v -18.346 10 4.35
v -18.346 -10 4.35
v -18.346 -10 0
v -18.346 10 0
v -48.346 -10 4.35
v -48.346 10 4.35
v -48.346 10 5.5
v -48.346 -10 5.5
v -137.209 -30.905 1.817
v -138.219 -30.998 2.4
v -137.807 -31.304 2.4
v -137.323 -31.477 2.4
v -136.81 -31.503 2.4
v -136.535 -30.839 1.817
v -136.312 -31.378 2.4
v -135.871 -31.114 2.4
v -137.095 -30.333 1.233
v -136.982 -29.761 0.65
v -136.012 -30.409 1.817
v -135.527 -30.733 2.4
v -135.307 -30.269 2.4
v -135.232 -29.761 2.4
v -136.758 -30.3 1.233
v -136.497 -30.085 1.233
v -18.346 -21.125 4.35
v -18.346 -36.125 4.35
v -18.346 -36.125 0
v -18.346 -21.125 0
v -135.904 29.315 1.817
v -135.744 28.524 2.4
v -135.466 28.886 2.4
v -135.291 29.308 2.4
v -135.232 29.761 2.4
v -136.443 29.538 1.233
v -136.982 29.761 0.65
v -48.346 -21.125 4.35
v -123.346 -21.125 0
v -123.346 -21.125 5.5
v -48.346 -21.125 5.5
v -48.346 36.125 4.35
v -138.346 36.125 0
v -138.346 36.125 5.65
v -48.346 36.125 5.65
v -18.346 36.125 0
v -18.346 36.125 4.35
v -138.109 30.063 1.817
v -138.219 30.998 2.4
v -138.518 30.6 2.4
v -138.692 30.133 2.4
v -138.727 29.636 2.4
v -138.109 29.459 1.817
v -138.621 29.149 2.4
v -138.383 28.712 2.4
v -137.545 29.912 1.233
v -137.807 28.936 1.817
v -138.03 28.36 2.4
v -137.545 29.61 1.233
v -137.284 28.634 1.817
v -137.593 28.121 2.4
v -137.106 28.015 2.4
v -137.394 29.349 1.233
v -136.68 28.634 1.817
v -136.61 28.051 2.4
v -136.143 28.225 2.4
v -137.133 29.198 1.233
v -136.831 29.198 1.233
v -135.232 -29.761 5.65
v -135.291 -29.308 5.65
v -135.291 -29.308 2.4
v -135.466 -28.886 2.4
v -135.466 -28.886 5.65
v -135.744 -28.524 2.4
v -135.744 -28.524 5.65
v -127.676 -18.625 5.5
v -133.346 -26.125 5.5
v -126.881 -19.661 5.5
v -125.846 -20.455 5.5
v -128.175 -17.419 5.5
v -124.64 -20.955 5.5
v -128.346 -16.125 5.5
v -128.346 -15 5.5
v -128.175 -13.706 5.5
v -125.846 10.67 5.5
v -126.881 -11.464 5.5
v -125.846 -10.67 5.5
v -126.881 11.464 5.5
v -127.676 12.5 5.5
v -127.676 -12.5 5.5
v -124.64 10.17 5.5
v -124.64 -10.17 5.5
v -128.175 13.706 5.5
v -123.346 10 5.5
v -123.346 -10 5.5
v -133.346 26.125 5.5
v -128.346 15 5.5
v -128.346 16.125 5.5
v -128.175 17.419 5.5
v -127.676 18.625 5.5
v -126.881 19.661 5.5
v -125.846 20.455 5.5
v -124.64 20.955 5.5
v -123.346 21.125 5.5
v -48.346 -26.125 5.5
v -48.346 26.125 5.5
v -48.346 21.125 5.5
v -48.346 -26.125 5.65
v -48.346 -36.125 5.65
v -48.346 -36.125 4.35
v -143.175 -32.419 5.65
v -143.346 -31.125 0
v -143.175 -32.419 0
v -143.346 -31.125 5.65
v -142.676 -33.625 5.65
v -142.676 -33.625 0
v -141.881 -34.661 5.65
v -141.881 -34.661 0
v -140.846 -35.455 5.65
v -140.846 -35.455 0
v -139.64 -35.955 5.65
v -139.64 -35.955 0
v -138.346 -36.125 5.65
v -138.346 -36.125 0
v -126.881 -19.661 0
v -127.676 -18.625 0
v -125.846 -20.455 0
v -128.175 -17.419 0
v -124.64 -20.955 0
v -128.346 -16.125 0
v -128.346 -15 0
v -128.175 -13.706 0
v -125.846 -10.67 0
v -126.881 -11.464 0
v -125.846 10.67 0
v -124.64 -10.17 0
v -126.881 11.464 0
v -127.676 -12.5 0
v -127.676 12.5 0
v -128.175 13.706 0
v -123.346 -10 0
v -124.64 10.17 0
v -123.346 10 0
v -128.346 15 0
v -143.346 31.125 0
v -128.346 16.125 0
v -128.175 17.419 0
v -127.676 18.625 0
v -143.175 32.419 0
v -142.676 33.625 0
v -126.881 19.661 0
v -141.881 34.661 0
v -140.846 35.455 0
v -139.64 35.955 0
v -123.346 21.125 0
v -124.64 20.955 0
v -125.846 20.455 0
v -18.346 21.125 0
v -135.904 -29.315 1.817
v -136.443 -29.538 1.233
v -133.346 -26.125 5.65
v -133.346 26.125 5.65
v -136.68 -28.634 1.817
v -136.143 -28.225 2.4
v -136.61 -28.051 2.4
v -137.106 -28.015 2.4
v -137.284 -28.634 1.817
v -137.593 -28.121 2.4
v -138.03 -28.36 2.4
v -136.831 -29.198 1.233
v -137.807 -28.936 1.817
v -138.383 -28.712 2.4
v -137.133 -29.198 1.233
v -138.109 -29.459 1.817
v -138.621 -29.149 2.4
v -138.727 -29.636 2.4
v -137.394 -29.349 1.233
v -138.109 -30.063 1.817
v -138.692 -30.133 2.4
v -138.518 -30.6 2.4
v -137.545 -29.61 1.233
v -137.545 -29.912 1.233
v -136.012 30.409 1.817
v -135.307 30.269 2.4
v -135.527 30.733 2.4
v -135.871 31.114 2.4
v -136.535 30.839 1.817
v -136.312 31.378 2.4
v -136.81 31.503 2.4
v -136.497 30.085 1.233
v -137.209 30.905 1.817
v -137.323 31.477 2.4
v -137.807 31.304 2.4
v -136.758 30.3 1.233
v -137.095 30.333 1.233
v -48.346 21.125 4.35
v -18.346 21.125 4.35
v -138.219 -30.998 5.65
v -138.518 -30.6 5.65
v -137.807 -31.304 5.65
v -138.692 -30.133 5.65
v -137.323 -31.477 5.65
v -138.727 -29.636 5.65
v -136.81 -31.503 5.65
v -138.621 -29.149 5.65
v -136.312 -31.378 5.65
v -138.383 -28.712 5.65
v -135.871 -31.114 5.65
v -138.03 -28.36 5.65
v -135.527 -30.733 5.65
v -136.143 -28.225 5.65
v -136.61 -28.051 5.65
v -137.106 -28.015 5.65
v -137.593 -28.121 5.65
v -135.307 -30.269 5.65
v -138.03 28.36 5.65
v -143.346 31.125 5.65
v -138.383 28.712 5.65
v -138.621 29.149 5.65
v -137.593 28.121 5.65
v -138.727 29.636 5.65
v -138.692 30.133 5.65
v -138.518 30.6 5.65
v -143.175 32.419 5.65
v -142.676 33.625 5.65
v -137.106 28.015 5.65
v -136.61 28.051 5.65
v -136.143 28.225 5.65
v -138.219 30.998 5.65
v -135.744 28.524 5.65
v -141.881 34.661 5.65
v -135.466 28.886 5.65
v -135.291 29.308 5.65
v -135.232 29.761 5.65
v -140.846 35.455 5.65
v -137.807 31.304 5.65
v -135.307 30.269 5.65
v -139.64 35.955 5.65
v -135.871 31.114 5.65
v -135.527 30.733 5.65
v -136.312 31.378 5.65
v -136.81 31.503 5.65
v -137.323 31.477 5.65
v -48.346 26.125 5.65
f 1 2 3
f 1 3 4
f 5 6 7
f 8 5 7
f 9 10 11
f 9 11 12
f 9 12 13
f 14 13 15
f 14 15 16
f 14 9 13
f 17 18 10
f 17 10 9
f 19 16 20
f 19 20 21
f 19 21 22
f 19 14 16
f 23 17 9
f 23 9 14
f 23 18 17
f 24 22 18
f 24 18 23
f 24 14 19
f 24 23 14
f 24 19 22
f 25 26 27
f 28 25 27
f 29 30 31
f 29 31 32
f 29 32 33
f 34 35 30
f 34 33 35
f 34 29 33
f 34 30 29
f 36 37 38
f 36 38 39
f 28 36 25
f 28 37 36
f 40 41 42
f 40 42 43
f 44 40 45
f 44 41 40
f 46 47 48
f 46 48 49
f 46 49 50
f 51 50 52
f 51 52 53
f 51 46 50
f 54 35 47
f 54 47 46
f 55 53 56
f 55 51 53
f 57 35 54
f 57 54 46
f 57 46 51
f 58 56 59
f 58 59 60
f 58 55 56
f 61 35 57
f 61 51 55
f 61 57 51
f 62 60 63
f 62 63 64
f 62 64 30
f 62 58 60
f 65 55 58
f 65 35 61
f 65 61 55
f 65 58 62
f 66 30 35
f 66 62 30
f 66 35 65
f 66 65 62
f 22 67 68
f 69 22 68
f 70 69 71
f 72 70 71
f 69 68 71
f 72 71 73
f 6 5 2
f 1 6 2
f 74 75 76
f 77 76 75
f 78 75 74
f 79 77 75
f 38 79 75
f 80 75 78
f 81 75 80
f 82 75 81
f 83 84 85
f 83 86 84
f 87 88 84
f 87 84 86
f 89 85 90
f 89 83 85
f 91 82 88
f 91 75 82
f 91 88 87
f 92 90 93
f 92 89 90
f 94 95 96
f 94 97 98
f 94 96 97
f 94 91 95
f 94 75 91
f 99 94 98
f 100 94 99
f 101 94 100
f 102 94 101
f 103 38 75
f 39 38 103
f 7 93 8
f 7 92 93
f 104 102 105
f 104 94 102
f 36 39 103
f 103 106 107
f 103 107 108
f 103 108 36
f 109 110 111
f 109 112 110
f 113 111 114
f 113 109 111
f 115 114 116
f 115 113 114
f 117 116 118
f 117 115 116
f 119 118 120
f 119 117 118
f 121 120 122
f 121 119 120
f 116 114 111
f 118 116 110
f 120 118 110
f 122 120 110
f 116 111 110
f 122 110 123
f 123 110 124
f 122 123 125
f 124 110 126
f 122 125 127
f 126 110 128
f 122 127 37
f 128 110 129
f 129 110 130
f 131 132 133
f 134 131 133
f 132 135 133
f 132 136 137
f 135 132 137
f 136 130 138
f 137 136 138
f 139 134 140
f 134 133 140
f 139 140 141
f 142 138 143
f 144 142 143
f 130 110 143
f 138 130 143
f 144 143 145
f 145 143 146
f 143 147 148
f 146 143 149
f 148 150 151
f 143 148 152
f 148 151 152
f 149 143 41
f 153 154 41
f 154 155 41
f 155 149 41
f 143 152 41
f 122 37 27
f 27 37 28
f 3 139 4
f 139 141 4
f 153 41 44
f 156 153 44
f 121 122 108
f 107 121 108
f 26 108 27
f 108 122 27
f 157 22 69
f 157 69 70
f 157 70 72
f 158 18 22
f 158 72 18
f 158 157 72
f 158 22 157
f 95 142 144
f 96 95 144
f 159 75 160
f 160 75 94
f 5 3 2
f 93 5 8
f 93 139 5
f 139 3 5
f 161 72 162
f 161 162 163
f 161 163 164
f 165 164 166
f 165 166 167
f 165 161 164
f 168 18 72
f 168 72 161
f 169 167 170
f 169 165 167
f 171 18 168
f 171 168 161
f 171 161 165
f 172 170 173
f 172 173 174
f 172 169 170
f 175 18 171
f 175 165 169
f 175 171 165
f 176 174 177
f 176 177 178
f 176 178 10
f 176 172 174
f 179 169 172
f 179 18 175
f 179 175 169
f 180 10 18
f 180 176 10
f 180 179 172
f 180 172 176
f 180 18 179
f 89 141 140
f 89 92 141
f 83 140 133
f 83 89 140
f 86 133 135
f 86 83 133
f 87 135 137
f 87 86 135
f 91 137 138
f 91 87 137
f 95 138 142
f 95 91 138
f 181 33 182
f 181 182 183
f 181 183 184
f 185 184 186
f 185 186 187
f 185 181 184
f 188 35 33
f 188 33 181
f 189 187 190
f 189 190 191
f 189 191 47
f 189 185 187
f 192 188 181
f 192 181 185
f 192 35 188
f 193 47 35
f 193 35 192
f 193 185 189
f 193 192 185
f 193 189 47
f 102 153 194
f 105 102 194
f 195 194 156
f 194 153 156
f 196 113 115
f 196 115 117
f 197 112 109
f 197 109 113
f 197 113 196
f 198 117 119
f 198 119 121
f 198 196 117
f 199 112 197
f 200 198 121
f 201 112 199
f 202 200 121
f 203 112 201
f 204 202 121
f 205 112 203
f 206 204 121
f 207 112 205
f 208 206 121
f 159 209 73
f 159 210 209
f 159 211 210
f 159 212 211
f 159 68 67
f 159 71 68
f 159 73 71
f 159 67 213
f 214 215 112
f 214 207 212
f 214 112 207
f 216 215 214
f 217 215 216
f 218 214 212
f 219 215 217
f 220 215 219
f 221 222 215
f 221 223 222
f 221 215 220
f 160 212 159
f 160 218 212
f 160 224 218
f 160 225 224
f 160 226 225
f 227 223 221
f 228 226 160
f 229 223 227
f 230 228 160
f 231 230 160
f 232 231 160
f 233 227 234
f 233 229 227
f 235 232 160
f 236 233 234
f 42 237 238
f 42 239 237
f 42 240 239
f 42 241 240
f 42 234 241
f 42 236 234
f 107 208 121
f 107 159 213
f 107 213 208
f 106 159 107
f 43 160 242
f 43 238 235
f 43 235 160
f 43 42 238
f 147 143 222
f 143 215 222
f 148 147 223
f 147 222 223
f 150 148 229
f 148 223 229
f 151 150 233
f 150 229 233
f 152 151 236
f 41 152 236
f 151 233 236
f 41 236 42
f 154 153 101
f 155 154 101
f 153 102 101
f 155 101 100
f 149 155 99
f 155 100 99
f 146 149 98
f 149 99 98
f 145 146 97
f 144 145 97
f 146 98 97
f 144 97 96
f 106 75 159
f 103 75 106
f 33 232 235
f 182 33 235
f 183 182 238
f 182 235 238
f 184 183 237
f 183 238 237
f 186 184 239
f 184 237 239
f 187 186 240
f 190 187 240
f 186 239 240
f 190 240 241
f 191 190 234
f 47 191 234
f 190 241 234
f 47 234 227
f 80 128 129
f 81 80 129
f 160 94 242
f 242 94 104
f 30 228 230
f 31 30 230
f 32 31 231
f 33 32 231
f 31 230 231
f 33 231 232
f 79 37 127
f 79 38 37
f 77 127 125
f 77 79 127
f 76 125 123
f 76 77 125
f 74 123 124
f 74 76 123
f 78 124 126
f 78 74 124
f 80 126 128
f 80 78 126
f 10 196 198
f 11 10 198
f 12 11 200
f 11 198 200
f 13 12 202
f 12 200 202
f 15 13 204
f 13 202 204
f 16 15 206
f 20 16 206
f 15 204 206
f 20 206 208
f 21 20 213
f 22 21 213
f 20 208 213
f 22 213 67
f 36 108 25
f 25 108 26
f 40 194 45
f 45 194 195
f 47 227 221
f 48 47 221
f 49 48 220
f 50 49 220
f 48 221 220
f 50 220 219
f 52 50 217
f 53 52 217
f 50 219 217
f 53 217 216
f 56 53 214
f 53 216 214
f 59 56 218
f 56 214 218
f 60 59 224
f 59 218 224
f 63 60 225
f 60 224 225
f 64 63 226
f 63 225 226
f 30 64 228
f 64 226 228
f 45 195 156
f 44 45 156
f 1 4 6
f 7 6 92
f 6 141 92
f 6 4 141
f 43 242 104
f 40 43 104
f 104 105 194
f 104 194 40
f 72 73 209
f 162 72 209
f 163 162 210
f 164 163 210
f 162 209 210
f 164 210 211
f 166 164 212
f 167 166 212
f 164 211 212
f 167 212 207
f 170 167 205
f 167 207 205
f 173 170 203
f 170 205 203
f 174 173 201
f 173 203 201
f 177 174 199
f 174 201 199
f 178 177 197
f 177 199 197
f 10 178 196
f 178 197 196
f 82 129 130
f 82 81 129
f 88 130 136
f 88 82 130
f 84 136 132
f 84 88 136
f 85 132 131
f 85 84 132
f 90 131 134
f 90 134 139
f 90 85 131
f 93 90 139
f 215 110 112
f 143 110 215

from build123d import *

# Parameters (mm, degrees)
F0_W      = 210
F0_H      = 52.25
F0_W_2    = 200
F0_H_2    = 42.25
F1_DEPTH  = 5.5
F0_W_3    = 230
F0_H_3    = 72.25
F2_DEPTH  = 5.65
F4_DEPTH  = 100
F6_DEPTH  = 5
F7_SIZE   = 1.75
F8_R      = 5
F9_R      = 5
F10_W     = 20
F10_H     = 5.5
F11_DEPTH = 110
F12_W     = 30
F12_H     = 1.15
F13_DEPTH = 25
F14_R     = 5


with BuildPart() as f1:
    # F0 (on Top) → F1 (new body)
    with BuildSketch(Plane.XY):
        with Locations((-28.3456140757, 0)):
            Rectangle(F0_W, F0_H)
        with Locations((-28.3456140757, 0)):
            Rectangle(F0_W_2, F0_H_2, mode=Mode.SUBTRACT)
    extrude(amount=F1_DEPTH)

    # F0 (on Top) → F2 (join)
    with BuildSketch(Plane.XY):
        with Locations((-28.3456140757, 0)):
            Rectangle(F0_W_3, F0_H_3)
        with Locations((-28.3456140757, 0)):
            Rectangle(F0_W, F0_H, mode=Mode.SUBTRACT)
    extrude(amount=F2_DEPTH)

    # F3 (on face) → F4 (cut)
    with BuildSketch(Plane.XZ.offset(36.125)):
        Polygon((-48.3456140757, 5.65), (-48.3456140757, 4.35), (-18.3456140757, 4.35), (-18.3456140757, 0), (86.6543859243, 0), (86.6543859243, 5.65), align=None)
    extrude(amount=-F4_DEPTH, mode=Mode.SUBTRACT)

    # F5 (on face) → F6 (cut)
    with BuildSketch(Plane.XY.offset(5.65)):
        with BuildLine():
            ThreePointArc((-135.231653045, 29.7610389693), (-136.3119570383, 31.3778281512), (-138.2190899121, 30.9984758364))
            Line((-138.2190899121, 30.9984758364), (-135.7442161779, 28.5236021022))
            ThreePointArc((-135.7442161779, 28.5236021022), (-135.3648638631, 29.0913429627), (-135.231653045, 29.7610389693))
        make_face()
        with BuildLine():
            Line((-135.7442161779, 28.5236021022), (-138.2190899121, 30.9984758364))
            ThreePointArc((-138.2190899121, 30.9984758364), (-138.2190899121, 28.5236021022), (-135.7442161779, 28.5236021022))
        make_face()
        with BuildLine():
            ThreePointArc((-135.7442161779, -28.5236021022), (-138.2190899121, -28.5236021022), (-138.2190899121, -30.9984758364))
            Line((-138.2190899121, -30.9984758364), (-135.7442161779, -28.5236021022))
        make_face()
        with BuildLine():
            Line((-135.7442161779, -28.5236021022), (-138.2190899121, -30.9984758364))
            ThreePointArc((-138.2190899121, -30.9984758364), (-136.3119570383, -31.3778281512), (-135.231653045, -29.7610389693))
            ThreePointArc((-135.231653045, -29.7610389693), (-135.3648638631, -29.0913429627), (-135.7442161779, -28.5236021022))
        make_face()
    extrude(amount=-F6_DEPTH, mode=Mode.SUBTRACT)

    # F7
    f7_edges = [f1.edges().sort_by_distance(p)[0] for p in [
        (-135.744216, -28.523602, 0.65),
        (-138.731653, 29.761039, 0.65),
    ]]
    chamfer(f7_edges, length=F7_SIZE)

    # F8
    f8_edges = [f1.edges().sort_by_distance(p)[0] for p in [
        (-143.345614, 36.125, 2.825),
        (-143.345614, -36.125, 2.825),
    ]]
    fillet(f8_edges, radius=F8_R)

    # F9
    f9_edges = [f1.edges().sort_by_distance(p)[0] for p in [
        (-128.345614, -21.125, 2.75),
        (-128.345614, 21.125, 2.75),
    ]]
    fillet(f9_edges, radius=F9_R)

    # F10 (on face) → F11 (join)
    with BuildSketch(Plane.YZ.offset(-128.3456140757)):
        with Locations((0, 2.75)):
            Rectangle(F10_W, F10_H)
    extrude(amount=F11_DEPTH)

    # F12 (on face) → F13 (cut)
    with BuildSketch(Plane.XZ.offset(10)):
        with Locations((-33.3456140757, 4.925)):
            Rectangle(F12_W, F12_H)
    extrude(amount=-F13_DEPTH, mode=Mode.SUBTRACT)

    # F14
    f14_edges = [f1.edges().sort_by_distance(p)[0] for p in [
        (-128.345614, -10, 2.75),
        (-128.345614, 10, 2.75),
    ]]
    fillet(f14_edges, radius=F14_R)


solid = f1.part
